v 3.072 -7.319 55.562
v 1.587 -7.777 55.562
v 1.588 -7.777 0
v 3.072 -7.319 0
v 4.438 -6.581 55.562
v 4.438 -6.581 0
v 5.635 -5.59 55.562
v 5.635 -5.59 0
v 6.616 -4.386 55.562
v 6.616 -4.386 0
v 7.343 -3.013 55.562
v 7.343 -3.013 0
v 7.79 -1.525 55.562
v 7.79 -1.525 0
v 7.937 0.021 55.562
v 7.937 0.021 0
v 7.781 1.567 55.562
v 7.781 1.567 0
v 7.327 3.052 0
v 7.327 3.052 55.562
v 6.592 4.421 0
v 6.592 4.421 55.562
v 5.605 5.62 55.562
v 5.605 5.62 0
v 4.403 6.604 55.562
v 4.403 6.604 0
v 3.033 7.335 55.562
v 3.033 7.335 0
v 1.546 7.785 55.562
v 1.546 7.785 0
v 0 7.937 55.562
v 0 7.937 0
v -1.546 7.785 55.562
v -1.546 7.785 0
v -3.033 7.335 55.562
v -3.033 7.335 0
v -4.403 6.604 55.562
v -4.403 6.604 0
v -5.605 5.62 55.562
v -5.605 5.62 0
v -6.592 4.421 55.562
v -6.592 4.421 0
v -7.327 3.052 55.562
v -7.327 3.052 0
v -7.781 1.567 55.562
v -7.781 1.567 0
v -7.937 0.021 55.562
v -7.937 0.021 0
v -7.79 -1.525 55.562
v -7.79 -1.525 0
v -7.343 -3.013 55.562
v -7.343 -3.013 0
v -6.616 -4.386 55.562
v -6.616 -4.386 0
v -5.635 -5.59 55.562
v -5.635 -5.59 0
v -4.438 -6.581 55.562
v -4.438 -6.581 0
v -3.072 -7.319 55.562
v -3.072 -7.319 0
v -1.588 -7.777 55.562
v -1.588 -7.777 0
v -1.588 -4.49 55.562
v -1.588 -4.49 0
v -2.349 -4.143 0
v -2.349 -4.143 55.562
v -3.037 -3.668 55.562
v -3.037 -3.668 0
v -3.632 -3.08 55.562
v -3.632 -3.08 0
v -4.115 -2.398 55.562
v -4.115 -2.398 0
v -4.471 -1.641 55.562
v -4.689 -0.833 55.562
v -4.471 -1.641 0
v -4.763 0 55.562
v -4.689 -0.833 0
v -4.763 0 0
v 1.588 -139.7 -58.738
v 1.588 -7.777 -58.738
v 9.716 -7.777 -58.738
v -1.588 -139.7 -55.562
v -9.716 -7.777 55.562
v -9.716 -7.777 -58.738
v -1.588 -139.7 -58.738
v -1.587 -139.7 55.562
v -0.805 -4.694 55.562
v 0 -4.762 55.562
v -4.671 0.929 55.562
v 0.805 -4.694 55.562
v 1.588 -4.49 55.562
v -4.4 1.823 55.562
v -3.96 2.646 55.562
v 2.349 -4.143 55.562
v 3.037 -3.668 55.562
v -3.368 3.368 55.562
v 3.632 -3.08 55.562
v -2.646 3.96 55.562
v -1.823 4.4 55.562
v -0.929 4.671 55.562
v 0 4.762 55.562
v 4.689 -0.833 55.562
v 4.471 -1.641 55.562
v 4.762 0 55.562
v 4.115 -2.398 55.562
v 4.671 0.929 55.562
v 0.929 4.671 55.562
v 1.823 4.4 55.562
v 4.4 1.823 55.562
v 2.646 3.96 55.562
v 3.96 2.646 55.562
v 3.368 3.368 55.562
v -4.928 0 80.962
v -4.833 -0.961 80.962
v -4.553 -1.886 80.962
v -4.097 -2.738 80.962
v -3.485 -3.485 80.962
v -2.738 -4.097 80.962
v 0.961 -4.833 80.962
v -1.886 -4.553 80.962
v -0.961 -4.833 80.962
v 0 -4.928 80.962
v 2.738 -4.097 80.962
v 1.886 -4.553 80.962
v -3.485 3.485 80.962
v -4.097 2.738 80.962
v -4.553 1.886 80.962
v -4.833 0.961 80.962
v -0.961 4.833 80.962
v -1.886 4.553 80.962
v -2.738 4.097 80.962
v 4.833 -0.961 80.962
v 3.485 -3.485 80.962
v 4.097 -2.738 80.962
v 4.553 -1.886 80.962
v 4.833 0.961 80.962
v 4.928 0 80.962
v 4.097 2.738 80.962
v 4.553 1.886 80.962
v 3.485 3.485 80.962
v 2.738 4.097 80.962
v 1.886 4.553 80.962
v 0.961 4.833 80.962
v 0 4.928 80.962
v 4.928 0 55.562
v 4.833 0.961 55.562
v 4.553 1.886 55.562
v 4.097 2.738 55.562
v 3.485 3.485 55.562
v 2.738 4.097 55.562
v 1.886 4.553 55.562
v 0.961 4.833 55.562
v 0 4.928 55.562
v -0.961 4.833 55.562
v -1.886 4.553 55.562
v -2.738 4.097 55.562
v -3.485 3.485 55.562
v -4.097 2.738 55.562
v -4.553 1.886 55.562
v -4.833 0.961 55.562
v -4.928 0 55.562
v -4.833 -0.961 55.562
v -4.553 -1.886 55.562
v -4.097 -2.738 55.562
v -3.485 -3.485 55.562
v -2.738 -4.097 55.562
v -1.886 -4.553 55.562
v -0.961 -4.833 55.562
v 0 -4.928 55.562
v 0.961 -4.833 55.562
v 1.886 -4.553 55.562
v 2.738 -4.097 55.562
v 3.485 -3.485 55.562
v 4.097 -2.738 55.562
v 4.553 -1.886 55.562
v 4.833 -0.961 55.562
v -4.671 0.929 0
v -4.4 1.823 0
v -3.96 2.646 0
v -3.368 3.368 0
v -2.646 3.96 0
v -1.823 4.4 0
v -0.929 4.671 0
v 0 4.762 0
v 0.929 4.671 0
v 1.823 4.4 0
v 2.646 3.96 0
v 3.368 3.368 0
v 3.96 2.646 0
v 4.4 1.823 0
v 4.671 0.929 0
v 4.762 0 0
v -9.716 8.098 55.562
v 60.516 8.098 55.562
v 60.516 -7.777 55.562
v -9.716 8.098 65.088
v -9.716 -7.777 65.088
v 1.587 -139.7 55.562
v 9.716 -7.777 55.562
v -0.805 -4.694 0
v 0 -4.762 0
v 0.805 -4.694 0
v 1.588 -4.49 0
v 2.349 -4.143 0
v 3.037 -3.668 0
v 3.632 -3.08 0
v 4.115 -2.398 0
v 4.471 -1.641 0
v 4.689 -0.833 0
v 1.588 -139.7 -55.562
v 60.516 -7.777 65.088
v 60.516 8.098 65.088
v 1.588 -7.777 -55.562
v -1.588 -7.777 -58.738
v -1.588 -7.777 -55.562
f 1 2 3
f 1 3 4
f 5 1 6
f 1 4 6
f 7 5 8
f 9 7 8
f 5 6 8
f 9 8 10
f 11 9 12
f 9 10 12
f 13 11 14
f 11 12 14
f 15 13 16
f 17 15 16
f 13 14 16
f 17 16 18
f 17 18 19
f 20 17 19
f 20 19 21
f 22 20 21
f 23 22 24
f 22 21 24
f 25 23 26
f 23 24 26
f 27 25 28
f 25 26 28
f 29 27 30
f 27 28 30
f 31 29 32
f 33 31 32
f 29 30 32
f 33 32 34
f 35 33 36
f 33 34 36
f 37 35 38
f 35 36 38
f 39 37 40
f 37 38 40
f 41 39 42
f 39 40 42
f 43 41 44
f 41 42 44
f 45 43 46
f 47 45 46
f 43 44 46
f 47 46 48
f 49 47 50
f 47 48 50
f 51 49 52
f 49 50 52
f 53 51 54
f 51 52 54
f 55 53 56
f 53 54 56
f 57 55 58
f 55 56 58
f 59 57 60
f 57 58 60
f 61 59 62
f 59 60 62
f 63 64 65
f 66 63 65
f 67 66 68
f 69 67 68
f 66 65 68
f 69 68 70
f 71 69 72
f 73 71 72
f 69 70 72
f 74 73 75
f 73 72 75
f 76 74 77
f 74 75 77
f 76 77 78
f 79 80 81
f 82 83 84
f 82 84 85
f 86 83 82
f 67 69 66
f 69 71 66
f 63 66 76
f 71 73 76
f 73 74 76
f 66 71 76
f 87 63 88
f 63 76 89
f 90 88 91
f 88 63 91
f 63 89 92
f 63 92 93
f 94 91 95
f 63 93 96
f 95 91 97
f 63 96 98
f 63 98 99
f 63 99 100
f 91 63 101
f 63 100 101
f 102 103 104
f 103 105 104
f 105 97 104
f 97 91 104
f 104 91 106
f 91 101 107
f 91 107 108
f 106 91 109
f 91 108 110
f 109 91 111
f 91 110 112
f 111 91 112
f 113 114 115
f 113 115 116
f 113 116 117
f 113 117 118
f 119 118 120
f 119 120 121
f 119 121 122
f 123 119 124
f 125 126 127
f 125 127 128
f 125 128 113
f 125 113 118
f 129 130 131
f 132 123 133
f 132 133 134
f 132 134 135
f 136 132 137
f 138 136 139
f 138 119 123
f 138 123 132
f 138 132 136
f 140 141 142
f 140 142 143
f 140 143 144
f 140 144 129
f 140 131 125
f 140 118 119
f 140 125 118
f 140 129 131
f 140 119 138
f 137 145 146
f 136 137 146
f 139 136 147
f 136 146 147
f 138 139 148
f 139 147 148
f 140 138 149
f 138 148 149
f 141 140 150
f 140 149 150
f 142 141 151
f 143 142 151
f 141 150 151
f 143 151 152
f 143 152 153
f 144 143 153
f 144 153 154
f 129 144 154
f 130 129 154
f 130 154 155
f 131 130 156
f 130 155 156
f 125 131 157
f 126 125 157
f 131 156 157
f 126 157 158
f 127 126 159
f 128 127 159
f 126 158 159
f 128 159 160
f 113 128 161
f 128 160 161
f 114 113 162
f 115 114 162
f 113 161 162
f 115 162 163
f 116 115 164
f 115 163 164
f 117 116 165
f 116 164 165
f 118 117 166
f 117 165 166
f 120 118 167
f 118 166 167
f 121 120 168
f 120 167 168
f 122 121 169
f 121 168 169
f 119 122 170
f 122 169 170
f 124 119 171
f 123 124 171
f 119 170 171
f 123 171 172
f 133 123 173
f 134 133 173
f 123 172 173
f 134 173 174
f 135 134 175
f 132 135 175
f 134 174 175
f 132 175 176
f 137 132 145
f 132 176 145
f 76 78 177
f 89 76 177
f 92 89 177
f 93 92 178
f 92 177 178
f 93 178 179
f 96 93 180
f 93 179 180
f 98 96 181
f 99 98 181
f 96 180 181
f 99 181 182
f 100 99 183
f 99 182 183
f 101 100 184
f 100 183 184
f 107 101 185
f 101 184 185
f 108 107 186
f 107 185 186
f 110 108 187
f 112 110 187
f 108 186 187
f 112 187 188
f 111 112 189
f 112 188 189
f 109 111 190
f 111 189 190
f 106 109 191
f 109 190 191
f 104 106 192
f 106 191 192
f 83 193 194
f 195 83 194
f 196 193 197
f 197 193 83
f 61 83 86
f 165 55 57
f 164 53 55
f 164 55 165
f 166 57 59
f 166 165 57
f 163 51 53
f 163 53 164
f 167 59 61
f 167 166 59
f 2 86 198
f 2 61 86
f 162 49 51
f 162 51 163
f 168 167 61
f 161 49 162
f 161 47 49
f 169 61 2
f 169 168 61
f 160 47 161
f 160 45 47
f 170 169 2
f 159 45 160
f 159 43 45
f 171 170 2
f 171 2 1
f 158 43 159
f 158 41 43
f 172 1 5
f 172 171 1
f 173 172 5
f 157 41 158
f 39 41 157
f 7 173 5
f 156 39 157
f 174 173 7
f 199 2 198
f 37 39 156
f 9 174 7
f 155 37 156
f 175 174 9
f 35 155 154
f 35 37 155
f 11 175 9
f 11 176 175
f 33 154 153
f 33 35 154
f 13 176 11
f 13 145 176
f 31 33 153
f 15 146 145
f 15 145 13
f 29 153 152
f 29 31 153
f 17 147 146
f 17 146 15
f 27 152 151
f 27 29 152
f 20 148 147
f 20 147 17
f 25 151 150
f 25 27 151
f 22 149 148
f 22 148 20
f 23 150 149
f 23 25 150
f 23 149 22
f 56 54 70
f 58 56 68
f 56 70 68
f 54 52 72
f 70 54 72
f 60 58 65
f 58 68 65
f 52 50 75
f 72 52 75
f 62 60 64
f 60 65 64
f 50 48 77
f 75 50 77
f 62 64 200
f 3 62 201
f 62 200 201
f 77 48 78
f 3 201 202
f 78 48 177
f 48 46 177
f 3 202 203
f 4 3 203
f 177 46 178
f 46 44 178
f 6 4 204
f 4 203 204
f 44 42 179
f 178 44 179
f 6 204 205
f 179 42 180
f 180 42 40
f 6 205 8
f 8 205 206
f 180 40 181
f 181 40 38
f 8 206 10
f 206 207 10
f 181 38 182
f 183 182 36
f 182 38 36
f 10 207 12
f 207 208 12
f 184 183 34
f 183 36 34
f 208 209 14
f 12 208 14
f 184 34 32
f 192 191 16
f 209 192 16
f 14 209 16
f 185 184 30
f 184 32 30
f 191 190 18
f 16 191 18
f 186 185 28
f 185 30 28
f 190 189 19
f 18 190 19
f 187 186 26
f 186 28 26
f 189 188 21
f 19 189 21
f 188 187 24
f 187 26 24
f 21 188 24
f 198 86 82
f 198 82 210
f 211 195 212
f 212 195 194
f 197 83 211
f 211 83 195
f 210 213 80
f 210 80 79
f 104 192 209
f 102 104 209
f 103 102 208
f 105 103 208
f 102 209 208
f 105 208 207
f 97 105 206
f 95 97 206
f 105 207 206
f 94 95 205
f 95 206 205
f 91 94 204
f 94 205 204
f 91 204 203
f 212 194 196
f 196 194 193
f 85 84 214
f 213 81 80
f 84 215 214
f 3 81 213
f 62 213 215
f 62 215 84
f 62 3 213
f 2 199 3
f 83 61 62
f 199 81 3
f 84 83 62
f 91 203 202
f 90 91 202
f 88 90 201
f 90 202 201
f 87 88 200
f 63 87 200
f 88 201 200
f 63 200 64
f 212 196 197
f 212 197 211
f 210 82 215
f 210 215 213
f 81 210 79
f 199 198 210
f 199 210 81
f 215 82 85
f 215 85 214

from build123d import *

# Parameters (mm, degrees)
F1_DEPTH = 55.5625
F2_W     = 3.175
F2_H     = 131.9228700667
F3_DEPTH = 55.5625
F5_DEPTH = 114.3
F6_R     = 4.9279707003
F7_DEPTH = 25.4
F9_DEPTH = 9.525


with BuildPart() as f1:
    # F0 (on Top) → F1 (new body)
    with BuildSketch(Plane.XY):
        with BuildLine():
            ThreePointArc((1.5875, -7.7771299333), (6.1483610621, -5.0201157855), (7.9375, 0))
            ThreePointArc((7.9375, 0), (-5.0201157855, 6.1483610621), (-1.5875, -7.7771299333))
            Line((-1.5875, -7.7771299333), (-1.5875, -4.4901280605))
            ThreePointArc((-1.5875, -4.4901280605), (-3.8885649667, -2.749630657), (-4.7625, 0))
            ThreePointArc((-4.7625, 0), (0, 4.7625), (4.7625, 0))
            ThreePointArc((4.7625, 0), (3.8885649667, -2.749630657), (1.5875, -4.4901280605))
            Line((1.5875, -4.4901280605), (1.5875, -7.7771299333))
        make_face()
        with BuildLine():
            Line((-1.5875, -4.4901280605), (-1.5875, -7.7771299333))
            ThreePointArc((-1.5875, -7.7771299333), (0, -7.9375), (1.5875, -7.7771299333))
            Line((1.5875, -7.7771299333), (1.5875, -4.4901280605))
            ThreePointArc((1.5875, -4.4901280605), (0, -4.7625), (-1.5875, -4.4901280605))
        make_face()
        with BuildLine():
            ThreePointArc((1.5875, -7.7771299333), (0, -7.9375), (-1.5875, -7.7771299333))
            Line((-1.5875, -7.7771299333), (-1.5875, -139.7))
            Line((-1.5875, -139.7), (1.5875, -139.7))
            Line((1.5875, -139.7), (1.5875, -7.7771299333))
        make_face()
    extrude(amount=F1_DEPTH)

    # F2 (on face) → F3 (join)
    with BuildSketch(Plane(origin=(0, 0, 0), x_dir=(1, 0, 0), z_dir=(0, 0, -1))):
        with Locations((0, 73.7385649667)):
            Rectangle(F2_W, F2_H)
    extrude(amount=F3_DEPTH)

    # F4 (on face) → F5 (join)
    with BuildSketch(Plane.XY.offset(55.5625)):
        Polygon((-1.5875, -139.7), (-1.5875, -7.7771299333), (-9.7155, -7.7771299333), align=None)
        Polygon((9.7155, -7.7771299333), (1.5875, -7.7771299333), (1.5875, -139.7), align=None)
    extrude(amount=-F5_DEPTH)

    # F6 (on face) → F7 (join)
    with BuildSketch(Plane.XY.offset(55.5625)):
        Circle(F6_R)
    extrude(amount=F7_DEPTH)


with BuildPart() as f9:
    # F8 (on face) → F9 (new body)
    with BuildSketch(Plane.XY.offset(55.5625)):
        Polygon((-9.7155, 8.0978700667), (-9.7155, -7.7771299333), (9.7155, -7.7771299333), (60.5155, -7.7771299333), (60.5155, 8.0978700667), (9.7155, 8.0978700667), align=None)
    extrude(amount=F9_DEPTH)


solid = Compound([f1.part, f9.part])
